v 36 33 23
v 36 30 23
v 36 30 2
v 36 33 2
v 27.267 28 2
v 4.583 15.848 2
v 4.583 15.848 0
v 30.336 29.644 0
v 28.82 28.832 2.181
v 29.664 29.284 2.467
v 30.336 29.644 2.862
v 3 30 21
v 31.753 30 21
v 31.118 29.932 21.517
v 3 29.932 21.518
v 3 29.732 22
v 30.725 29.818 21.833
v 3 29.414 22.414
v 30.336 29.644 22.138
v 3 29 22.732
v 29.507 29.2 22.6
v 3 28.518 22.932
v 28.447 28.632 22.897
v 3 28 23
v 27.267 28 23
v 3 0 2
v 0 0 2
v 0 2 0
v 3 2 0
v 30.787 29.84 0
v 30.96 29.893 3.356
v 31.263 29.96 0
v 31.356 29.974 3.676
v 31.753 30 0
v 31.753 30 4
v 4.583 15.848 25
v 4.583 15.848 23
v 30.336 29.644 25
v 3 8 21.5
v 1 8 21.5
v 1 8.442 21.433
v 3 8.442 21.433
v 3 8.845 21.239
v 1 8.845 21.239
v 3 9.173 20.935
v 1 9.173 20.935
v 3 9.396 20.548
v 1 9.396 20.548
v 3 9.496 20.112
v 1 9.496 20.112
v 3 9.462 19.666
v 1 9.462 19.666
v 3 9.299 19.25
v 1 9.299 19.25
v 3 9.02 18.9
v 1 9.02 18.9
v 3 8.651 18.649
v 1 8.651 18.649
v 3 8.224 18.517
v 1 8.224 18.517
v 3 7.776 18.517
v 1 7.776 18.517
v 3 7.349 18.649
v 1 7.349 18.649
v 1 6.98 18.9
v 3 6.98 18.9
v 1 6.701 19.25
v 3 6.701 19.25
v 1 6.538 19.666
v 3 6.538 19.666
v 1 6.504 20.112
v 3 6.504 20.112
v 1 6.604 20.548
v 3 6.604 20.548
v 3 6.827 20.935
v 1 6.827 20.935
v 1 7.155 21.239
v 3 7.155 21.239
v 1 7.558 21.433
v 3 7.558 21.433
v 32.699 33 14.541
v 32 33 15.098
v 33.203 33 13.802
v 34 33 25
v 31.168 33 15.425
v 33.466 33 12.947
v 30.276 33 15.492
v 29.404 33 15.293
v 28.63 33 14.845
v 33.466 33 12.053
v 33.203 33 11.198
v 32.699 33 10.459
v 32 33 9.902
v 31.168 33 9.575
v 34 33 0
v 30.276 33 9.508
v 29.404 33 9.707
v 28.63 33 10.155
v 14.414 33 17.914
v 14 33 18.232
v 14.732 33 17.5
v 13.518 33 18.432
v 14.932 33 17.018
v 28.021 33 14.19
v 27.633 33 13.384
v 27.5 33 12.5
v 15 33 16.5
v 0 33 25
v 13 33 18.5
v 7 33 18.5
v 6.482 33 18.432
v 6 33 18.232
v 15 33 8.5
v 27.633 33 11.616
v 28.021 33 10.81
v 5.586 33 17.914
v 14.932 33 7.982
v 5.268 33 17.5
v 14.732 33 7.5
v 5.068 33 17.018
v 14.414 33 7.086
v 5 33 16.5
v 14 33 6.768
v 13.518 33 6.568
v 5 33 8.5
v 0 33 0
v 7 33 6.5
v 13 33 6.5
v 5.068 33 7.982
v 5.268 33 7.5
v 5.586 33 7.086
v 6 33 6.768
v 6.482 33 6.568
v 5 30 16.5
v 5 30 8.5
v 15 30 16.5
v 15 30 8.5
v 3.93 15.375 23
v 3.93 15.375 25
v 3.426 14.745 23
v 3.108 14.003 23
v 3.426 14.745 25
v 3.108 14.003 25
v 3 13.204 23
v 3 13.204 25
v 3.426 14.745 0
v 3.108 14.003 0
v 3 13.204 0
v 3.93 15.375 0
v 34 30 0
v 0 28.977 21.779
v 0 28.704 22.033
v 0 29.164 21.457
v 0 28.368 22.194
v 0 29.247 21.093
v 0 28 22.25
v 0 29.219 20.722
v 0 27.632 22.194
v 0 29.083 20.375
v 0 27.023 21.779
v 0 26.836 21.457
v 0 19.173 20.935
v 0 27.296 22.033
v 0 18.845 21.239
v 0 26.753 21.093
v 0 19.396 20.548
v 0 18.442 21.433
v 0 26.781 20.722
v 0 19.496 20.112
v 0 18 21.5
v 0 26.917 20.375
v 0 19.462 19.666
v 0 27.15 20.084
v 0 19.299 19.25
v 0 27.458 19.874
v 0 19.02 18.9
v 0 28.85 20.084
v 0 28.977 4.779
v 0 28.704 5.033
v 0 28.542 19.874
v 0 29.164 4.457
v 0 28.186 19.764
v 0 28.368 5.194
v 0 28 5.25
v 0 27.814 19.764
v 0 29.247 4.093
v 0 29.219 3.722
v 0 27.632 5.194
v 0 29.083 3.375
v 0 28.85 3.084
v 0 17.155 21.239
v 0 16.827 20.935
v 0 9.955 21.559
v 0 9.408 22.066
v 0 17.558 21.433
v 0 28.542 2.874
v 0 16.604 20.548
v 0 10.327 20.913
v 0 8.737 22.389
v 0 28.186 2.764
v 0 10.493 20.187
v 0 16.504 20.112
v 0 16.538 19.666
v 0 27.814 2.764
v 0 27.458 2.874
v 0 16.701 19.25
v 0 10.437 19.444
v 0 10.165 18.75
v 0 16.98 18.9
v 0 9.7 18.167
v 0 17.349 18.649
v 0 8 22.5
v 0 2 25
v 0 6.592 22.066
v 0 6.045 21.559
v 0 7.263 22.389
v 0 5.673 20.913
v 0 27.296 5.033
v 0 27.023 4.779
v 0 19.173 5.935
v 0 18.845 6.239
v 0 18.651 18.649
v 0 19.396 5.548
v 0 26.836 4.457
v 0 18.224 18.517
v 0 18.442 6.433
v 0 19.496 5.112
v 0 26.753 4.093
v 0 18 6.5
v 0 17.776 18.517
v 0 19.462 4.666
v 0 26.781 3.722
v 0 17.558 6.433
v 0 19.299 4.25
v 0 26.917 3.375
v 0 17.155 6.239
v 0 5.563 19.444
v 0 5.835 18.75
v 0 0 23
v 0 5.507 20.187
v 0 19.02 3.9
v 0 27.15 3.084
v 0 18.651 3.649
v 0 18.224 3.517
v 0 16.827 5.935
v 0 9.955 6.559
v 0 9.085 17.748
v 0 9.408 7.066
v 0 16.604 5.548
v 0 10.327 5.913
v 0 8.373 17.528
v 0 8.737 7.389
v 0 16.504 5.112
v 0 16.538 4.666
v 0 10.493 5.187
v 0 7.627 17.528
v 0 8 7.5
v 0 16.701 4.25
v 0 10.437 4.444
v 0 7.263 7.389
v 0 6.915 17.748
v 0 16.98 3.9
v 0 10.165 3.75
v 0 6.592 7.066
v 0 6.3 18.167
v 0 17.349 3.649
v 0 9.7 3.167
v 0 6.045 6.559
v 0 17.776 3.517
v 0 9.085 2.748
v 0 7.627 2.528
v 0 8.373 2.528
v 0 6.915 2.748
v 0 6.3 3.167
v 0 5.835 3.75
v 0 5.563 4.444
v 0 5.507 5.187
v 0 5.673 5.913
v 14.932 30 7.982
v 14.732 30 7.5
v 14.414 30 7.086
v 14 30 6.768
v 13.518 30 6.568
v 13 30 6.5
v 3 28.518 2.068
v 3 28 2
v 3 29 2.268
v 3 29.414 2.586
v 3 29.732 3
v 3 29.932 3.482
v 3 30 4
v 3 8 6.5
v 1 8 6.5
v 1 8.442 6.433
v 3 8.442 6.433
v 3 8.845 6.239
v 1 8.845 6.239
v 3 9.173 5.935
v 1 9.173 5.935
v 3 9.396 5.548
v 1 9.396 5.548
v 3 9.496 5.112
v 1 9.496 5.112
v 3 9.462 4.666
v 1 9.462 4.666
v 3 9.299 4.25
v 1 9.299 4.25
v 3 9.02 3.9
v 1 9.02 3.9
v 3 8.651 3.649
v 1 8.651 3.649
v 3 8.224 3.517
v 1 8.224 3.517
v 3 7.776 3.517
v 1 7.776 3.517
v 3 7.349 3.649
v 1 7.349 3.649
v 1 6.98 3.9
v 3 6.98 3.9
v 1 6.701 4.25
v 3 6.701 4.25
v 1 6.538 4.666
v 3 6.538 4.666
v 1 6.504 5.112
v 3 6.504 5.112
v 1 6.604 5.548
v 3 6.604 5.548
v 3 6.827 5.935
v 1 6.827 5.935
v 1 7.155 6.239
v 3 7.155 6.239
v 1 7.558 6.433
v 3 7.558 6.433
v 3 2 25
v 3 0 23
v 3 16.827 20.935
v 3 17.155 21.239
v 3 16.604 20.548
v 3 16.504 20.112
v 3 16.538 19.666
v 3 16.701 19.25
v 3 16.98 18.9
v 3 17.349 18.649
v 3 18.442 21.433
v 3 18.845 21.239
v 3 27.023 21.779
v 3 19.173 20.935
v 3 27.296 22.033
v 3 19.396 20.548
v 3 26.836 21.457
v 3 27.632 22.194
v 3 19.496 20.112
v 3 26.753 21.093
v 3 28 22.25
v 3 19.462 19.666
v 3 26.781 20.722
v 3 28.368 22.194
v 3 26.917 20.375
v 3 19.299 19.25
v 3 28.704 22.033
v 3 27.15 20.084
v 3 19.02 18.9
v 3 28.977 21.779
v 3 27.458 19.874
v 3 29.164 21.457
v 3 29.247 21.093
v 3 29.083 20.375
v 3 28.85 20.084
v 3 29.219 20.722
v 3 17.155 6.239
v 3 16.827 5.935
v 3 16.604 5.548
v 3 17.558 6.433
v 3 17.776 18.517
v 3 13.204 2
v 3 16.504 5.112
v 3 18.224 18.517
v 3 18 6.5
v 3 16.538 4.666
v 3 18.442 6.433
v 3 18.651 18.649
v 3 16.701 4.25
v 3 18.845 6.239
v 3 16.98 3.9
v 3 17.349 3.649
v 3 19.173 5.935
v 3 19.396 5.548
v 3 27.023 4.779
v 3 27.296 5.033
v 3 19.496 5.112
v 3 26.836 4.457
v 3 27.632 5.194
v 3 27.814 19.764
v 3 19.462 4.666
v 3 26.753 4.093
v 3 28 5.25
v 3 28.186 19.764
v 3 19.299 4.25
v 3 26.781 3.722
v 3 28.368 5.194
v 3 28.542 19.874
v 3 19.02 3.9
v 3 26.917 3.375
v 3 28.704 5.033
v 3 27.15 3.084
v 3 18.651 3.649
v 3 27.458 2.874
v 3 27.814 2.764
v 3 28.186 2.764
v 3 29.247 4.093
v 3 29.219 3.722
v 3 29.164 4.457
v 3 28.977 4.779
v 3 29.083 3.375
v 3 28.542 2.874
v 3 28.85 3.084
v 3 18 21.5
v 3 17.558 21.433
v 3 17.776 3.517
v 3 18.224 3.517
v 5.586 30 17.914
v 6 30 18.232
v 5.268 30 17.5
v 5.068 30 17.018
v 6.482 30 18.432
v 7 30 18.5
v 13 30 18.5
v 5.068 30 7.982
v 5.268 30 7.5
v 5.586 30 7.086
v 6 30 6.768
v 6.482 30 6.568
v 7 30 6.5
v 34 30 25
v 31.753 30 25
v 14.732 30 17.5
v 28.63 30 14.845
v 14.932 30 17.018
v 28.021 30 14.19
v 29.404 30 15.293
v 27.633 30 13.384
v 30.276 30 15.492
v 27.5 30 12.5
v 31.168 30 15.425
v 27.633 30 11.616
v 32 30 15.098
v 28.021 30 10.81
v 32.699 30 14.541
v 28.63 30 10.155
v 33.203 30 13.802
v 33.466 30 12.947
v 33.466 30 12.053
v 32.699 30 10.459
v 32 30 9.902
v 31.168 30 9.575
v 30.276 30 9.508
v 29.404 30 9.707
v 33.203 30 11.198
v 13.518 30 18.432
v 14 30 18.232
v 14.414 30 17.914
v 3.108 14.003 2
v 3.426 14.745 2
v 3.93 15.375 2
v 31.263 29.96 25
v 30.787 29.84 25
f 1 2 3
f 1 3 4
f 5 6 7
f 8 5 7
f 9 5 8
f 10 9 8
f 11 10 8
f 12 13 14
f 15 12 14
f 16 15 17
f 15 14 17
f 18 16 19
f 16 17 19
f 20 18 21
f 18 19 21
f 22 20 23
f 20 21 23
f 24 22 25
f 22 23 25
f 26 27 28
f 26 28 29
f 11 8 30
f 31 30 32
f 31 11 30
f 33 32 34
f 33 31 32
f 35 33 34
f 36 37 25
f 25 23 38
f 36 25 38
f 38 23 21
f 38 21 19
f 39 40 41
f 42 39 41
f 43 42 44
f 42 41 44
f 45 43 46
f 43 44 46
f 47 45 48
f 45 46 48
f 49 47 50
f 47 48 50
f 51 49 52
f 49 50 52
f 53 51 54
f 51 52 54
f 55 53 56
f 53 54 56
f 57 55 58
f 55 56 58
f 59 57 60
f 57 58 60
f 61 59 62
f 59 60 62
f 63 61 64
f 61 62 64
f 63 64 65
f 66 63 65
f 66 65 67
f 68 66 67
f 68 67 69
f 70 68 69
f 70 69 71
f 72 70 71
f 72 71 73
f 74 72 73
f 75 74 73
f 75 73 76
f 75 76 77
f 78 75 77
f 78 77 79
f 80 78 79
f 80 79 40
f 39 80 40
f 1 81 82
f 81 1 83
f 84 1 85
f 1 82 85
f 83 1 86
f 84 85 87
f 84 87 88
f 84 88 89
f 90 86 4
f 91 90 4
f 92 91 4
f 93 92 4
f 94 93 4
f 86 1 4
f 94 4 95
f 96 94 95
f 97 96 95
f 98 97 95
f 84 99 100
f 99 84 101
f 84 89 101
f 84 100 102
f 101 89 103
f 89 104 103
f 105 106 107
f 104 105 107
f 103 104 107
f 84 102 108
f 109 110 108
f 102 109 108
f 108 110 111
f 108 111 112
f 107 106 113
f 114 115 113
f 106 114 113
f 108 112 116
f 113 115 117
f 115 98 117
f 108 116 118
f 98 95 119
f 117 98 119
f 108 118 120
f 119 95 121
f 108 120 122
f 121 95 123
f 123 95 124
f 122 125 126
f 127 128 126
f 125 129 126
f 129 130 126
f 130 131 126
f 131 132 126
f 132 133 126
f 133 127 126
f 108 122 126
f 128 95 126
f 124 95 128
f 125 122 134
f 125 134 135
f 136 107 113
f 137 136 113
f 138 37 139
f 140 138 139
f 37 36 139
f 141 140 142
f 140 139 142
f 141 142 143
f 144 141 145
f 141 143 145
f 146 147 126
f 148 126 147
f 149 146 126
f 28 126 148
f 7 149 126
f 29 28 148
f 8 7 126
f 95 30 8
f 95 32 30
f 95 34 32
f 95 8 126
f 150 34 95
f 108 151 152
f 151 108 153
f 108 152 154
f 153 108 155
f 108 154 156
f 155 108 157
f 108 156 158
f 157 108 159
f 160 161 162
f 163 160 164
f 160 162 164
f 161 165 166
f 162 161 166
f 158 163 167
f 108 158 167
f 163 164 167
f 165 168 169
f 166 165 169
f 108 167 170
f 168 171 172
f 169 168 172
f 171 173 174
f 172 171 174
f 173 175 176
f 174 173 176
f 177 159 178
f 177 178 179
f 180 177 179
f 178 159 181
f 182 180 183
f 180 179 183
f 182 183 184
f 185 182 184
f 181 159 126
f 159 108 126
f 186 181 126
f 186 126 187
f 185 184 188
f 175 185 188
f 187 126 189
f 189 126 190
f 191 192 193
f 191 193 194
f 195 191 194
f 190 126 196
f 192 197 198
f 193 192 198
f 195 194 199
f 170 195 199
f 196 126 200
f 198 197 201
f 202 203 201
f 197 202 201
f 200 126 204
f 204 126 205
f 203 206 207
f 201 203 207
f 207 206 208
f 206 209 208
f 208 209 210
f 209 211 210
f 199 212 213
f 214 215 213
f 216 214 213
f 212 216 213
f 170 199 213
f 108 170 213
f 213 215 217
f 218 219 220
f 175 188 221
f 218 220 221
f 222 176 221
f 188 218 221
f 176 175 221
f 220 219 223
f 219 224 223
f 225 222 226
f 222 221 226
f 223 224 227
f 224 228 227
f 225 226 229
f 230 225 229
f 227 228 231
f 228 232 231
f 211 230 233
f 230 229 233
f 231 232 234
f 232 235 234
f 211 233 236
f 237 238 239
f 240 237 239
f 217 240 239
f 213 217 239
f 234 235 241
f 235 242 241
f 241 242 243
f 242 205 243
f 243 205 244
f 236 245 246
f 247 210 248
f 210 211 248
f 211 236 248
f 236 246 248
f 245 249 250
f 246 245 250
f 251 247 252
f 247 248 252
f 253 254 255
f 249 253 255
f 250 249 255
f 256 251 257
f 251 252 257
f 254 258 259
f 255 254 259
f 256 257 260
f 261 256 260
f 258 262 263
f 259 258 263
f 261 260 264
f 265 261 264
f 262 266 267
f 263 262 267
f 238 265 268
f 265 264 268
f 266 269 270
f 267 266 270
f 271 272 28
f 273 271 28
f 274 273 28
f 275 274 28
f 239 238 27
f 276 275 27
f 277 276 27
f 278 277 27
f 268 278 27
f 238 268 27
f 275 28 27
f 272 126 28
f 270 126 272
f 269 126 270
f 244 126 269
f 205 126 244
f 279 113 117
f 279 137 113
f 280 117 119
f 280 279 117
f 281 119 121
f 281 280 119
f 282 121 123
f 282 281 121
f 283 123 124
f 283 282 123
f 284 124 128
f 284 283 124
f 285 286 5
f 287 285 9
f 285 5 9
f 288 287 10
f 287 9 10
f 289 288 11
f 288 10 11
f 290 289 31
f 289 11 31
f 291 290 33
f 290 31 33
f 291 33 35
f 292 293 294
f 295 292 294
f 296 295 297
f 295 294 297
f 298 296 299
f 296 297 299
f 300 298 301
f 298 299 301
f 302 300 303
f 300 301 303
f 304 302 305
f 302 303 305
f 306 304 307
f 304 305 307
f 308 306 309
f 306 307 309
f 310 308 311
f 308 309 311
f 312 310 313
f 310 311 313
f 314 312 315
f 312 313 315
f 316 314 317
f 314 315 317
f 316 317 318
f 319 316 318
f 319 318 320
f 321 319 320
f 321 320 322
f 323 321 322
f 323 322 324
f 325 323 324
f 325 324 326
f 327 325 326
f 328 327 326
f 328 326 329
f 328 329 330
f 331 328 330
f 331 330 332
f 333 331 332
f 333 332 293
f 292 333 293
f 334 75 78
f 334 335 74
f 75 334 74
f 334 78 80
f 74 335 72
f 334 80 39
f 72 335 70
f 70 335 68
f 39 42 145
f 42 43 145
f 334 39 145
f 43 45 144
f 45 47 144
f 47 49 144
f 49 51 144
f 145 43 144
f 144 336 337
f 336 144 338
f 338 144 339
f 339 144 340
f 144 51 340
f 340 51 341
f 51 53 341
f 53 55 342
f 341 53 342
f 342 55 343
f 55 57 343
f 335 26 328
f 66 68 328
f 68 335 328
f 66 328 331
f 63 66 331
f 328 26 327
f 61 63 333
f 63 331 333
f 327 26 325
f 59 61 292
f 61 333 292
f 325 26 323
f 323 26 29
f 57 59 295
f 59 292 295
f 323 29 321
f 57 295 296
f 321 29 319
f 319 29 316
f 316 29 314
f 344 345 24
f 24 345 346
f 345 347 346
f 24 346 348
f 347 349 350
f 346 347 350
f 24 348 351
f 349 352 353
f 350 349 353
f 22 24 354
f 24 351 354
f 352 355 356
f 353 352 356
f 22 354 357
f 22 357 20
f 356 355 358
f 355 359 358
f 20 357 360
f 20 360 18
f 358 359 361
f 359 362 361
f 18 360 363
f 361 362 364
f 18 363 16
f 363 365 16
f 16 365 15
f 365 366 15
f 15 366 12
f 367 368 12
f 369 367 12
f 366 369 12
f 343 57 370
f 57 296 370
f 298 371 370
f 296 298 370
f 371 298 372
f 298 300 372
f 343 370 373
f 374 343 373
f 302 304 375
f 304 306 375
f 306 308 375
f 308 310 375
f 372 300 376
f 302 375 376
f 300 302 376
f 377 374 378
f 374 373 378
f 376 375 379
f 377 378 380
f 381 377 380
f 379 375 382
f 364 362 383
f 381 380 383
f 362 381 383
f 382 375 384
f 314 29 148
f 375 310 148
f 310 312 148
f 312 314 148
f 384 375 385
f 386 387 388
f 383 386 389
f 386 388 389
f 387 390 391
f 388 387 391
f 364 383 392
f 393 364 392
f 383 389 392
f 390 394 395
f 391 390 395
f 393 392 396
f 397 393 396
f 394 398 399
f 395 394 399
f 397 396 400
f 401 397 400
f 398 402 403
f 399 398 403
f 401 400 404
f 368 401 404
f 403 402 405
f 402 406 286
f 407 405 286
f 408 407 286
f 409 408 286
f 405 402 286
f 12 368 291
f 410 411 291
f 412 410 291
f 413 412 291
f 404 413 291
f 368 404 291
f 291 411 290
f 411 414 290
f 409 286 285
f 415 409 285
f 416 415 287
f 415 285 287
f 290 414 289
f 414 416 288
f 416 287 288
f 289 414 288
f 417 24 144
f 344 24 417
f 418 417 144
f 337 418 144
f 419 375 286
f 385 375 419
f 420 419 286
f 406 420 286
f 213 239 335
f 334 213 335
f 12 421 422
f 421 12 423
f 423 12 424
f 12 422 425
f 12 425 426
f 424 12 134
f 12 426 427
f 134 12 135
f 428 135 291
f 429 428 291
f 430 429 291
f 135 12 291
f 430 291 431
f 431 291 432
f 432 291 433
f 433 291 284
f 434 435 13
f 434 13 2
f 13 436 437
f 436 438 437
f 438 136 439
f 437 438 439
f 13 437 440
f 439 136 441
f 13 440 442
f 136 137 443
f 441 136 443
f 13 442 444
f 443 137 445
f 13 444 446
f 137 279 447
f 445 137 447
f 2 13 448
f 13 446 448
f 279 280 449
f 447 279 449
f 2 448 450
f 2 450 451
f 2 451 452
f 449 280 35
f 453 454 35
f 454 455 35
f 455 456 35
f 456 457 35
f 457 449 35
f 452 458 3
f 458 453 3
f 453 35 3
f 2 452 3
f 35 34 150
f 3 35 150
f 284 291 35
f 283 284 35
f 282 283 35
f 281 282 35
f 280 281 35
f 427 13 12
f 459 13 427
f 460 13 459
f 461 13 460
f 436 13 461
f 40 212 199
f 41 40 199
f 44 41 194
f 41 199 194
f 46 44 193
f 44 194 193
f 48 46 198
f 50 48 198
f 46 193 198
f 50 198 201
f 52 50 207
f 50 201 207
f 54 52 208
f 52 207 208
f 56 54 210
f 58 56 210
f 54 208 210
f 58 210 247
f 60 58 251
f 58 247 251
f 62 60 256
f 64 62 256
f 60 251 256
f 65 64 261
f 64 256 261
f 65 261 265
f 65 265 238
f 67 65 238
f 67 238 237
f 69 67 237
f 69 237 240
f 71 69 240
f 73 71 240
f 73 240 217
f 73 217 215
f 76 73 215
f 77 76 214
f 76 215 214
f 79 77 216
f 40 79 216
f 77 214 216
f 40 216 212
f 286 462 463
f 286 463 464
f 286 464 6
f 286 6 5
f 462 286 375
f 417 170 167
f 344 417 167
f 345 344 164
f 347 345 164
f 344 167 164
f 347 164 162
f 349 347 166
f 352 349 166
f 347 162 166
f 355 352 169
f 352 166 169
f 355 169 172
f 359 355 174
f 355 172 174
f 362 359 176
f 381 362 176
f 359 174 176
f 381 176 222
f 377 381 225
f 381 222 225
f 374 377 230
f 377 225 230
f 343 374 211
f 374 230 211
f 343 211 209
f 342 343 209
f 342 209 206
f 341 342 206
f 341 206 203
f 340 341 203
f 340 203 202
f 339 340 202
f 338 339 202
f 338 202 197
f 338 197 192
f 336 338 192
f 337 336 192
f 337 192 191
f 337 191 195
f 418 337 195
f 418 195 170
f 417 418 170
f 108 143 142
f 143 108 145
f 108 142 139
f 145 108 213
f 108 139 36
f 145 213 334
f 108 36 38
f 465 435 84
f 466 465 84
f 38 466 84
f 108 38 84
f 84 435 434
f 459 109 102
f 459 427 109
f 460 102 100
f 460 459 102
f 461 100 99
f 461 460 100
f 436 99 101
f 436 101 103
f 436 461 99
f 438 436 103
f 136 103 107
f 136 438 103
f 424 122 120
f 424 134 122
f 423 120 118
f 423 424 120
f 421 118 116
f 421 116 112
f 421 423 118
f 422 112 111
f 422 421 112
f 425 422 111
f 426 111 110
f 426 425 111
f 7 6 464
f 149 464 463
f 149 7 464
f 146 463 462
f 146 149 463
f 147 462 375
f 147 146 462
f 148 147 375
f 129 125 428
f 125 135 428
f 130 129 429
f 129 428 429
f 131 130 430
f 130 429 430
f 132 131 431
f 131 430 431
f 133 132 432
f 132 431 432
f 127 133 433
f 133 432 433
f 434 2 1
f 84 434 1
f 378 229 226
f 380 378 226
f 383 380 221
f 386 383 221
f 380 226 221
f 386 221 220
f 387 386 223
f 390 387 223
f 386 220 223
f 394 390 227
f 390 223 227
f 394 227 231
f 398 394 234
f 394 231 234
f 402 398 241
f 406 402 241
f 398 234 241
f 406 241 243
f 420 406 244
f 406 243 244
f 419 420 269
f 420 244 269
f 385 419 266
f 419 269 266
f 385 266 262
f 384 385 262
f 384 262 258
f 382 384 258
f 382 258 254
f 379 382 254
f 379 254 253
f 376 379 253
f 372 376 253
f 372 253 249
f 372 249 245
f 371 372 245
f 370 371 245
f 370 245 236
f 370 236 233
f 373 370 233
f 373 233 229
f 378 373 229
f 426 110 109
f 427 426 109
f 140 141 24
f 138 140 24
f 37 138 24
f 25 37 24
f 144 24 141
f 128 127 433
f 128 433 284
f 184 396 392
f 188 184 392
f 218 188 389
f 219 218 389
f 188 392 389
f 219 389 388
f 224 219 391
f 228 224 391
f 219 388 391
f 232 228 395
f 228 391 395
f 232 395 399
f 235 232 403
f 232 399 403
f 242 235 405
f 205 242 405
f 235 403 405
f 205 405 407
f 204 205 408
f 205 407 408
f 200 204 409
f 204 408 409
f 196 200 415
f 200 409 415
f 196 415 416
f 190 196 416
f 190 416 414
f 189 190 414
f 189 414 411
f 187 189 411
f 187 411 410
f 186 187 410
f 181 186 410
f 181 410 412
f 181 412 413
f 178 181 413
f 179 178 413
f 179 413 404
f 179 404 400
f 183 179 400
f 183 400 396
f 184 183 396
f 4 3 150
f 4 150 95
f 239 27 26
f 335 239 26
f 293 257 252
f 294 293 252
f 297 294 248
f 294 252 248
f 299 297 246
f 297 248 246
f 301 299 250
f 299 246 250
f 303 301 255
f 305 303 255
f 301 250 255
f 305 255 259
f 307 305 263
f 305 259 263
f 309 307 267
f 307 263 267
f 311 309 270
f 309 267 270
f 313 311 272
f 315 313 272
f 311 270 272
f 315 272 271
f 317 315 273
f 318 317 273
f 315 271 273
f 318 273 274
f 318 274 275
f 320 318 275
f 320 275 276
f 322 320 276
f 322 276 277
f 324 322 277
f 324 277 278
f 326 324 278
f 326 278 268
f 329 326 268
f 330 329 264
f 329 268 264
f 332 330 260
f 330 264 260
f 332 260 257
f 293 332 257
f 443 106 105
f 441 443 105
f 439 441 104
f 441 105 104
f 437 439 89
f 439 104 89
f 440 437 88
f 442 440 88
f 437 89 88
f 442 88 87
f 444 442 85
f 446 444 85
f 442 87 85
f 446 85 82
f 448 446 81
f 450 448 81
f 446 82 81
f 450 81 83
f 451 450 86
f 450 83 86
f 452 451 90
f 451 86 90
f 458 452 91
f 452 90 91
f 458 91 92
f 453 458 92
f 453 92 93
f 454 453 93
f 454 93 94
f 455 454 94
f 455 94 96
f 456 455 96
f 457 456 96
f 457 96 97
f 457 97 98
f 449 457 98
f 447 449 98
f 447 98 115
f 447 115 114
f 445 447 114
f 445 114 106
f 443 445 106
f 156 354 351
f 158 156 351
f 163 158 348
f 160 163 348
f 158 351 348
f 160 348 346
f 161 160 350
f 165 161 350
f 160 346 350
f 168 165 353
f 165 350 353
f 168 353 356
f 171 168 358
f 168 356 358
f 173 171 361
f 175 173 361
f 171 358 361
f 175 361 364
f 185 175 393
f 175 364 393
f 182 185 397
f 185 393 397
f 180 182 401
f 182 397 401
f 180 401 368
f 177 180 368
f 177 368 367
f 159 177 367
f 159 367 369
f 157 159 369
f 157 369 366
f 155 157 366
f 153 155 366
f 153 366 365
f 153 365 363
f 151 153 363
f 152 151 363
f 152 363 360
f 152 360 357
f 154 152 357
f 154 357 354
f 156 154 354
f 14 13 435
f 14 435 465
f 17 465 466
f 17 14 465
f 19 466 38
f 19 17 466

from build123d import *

# Parameters (mm, degrees)
EXTRUDE_1_DEPTH     = 25
SKETCH_2_R          = 1.5
CUT_EXTRUDE_1_DEPTH = 55.863466897
HOLE_WIZARD_M3_1_D  = 2.5
CHAMFER_1_SIZE      = 1
SKETCH_5_R          = 3
CUT_EXTRUDE_2_DEPTH = 25
CUT_EXTRUDE_3_REACH = 56.863
SKETCH_6_W          = 10
SKETCH_6_H          = 12
FILLET_1_R          = 2
CHAMFER_2_SIZE      = 2
RIB_2_REACH         = 56.863
SKETCH_7_WALL_W     = 143.491694144
SKETCH_7_WALL_H     = 2
RIB_3_REACH         = 56.863
SKETCH_8_WALL_W     = 143.491694144
SKETCH_8_WALL_H     = 2
FILLET_2_R          = 2
FILLET_3_R          = 3


with BuildPart() as part:
    # 草图1 → 凸台-拉伸1 (new body)
    with BuildSketch(Plane.XY):
        Polygon((3, 30), (36, 30), (36, 33), (0, 33), (0, 0), (3, 0), align=None)
    extrude(amount=EXTRUDE_1_DEPTH)

    # 草图2 → 切除-拉伸1 (cut, through all)
    with BuildSketch(Plane.ZY):
        with Locations((5, 18)):
            Circle(SKETCH_2_R)
        with Locations((20, 18)):
            Circle(SKETCH_2_R)
        with Locations((20, 8)):
            Circle(SKETCH_2_R)
        with Locations((5, 8)):
            Circle(SKETCH_2_R)
    extrude(amount=-CUT_EXTRUDE_1_DEPTH, mode=Mode.SUBTRACT)

    # M3 螺纹孔1 (through all)
    with Locations(Plane(origin=(0, 28, 4), x_dir=(0, 0, -1), z_dir=(-1, 0, 0))):
        with Locations((0, 0), (-17, 0)):
            Hole(HOLE_WIZARD_M3_1_D / 2)

    # 倒角1
    chamfer_1_edges = [part.edges().sort_by_distance(p)[0] for p in [
        (0, 8, 18.5),
        (0, 8, 3.5),
    ]]
    chamfer(chamfer_1_edges, length=CHAMFER_1_SIZE)

    # 草图5 → 切除-拉伸2 (cut)
    with BuildSketch(Plane(origin=(0, 33, 0), x_dir=(1, 0, 0), z_dir=(0, 1, 0))):
        with Locations(Location((30.5, -12.5, 0), (0, 0, 180))):
            Circle(SKETCH_5_R)
    extrude(amount=-CUT_EXTRUDE_2_DEPTH, mode=Mode.SUBTRACT)

    # 草图6 → 切除-拉伸3 (cut, up to next)
    with BuildSketch(Plane(origin=(0, 33, 0), x_dir=(1, 0, 0), z_dir=(0, 1, 0)), mode=Mode.PRIVATE) as cut_extrude_3_sk1:
        with Locations((10, -12.5)):
            Rectangle(SKETCH_6_W, SKETCH_6_H)
    cut_extrude_3_tool1 = extrude(cut_extrude_3_sk1.sketch, amount=-CUT_EXTRUDE_3_REACH, mode=Mode.PRIVATE) & part.part
    add(cut_extrude_3_tool1.solids().sort_by_distance((10, 33, 12.5))[0], mode=Mode.SUBTRACT)

    # 圆角1
    fillet_1_edges = [part.edges().sort_by_distance(p)[0] for p in [
        (15, 31.5, 6.5),
        (15, 31.5, 18.5),
        (5, 31.5, 18.5),
        (5, 31.5, 6.5),
    ]]
    fillet(fillet_1_edges, radius=FILLET_1_R)

    # 倒角2
    chamfer_2_edges = [part.edges().sort_by_distance(p)[0] for p in [
        (36, 31.5, 25),
        (36, 31.5, 0),
        (1.5, 0, 25),
        (1.5, 0, 0),
    ]]
    chamfer(chamfer_2_edges, length=CHAMFER_2_SIZE)

    # 草图7 wall → 筋2 (add, up to next)
    with BuildSketch(Plane(origin=(17, 22.5, 25), x_dir=(0.881479970029, 0.472221412515, 0), z_dir=(-0.472221412515, 0.881479970029, 0)), mode=Mode.PRIVATE) as rib_2_sk1:
        with Locations((0, 1)):
            Rectangle(SKETCH_7_WALL_W, SKETCH_7_WALL_H)
    rib_2_tool1 = extrude(rib_2_sk1.sketch, amount=RIB_2_REACH, mode=Mode.PRIVATE) - part.part
    add(rib_2_tool1.solids().sort_by_distance((17, 22.5, 25))[0])

    # 草图8 wall → 筋3 (add, up to next)
    with BuildSketch(Plane(origin=(17, 22.5, 0), x_dir=(0.881479970029, 0.472221412515, 0), z_dir=(0.472221412515, -0.881479970029, 0)), mode=Mode.PRIVATE) as rib_3_sk1:
        with Locations((0, 1)):
            Rectangle(SKETCH_8_WALL_W, SKETCH_8_WALL_H)
    rib_3_tool1 = extrude(rib_3_sk1.sketch, amount=-RIB_3_REACH, mode=Mode.PRIVATE) - part.part
    add(rib_3_tool1.solids().sort_by_distance((17, 22.5, 0))[0])

    # 圆角2
    fillet_2_edges = [part.edges().sort_by_distance(p)[0] for p in [
        (17, 30, 23),
        (17, 30, 2),
    ]]
    fillet(fillet_2_edges, radius=FILLET_2_R)

    # 圆角3
    fillet_3_edges = [part.edges().sort_by_distance(p)[0] for p in [
        (31, 30, 2),
        (31, 30, 23),
        (3, 15, 24),
        (3, 15, 1),
    ]]
    fillet(fillet_3_edges, radius=FILLET_3_R)


solid = part.part
